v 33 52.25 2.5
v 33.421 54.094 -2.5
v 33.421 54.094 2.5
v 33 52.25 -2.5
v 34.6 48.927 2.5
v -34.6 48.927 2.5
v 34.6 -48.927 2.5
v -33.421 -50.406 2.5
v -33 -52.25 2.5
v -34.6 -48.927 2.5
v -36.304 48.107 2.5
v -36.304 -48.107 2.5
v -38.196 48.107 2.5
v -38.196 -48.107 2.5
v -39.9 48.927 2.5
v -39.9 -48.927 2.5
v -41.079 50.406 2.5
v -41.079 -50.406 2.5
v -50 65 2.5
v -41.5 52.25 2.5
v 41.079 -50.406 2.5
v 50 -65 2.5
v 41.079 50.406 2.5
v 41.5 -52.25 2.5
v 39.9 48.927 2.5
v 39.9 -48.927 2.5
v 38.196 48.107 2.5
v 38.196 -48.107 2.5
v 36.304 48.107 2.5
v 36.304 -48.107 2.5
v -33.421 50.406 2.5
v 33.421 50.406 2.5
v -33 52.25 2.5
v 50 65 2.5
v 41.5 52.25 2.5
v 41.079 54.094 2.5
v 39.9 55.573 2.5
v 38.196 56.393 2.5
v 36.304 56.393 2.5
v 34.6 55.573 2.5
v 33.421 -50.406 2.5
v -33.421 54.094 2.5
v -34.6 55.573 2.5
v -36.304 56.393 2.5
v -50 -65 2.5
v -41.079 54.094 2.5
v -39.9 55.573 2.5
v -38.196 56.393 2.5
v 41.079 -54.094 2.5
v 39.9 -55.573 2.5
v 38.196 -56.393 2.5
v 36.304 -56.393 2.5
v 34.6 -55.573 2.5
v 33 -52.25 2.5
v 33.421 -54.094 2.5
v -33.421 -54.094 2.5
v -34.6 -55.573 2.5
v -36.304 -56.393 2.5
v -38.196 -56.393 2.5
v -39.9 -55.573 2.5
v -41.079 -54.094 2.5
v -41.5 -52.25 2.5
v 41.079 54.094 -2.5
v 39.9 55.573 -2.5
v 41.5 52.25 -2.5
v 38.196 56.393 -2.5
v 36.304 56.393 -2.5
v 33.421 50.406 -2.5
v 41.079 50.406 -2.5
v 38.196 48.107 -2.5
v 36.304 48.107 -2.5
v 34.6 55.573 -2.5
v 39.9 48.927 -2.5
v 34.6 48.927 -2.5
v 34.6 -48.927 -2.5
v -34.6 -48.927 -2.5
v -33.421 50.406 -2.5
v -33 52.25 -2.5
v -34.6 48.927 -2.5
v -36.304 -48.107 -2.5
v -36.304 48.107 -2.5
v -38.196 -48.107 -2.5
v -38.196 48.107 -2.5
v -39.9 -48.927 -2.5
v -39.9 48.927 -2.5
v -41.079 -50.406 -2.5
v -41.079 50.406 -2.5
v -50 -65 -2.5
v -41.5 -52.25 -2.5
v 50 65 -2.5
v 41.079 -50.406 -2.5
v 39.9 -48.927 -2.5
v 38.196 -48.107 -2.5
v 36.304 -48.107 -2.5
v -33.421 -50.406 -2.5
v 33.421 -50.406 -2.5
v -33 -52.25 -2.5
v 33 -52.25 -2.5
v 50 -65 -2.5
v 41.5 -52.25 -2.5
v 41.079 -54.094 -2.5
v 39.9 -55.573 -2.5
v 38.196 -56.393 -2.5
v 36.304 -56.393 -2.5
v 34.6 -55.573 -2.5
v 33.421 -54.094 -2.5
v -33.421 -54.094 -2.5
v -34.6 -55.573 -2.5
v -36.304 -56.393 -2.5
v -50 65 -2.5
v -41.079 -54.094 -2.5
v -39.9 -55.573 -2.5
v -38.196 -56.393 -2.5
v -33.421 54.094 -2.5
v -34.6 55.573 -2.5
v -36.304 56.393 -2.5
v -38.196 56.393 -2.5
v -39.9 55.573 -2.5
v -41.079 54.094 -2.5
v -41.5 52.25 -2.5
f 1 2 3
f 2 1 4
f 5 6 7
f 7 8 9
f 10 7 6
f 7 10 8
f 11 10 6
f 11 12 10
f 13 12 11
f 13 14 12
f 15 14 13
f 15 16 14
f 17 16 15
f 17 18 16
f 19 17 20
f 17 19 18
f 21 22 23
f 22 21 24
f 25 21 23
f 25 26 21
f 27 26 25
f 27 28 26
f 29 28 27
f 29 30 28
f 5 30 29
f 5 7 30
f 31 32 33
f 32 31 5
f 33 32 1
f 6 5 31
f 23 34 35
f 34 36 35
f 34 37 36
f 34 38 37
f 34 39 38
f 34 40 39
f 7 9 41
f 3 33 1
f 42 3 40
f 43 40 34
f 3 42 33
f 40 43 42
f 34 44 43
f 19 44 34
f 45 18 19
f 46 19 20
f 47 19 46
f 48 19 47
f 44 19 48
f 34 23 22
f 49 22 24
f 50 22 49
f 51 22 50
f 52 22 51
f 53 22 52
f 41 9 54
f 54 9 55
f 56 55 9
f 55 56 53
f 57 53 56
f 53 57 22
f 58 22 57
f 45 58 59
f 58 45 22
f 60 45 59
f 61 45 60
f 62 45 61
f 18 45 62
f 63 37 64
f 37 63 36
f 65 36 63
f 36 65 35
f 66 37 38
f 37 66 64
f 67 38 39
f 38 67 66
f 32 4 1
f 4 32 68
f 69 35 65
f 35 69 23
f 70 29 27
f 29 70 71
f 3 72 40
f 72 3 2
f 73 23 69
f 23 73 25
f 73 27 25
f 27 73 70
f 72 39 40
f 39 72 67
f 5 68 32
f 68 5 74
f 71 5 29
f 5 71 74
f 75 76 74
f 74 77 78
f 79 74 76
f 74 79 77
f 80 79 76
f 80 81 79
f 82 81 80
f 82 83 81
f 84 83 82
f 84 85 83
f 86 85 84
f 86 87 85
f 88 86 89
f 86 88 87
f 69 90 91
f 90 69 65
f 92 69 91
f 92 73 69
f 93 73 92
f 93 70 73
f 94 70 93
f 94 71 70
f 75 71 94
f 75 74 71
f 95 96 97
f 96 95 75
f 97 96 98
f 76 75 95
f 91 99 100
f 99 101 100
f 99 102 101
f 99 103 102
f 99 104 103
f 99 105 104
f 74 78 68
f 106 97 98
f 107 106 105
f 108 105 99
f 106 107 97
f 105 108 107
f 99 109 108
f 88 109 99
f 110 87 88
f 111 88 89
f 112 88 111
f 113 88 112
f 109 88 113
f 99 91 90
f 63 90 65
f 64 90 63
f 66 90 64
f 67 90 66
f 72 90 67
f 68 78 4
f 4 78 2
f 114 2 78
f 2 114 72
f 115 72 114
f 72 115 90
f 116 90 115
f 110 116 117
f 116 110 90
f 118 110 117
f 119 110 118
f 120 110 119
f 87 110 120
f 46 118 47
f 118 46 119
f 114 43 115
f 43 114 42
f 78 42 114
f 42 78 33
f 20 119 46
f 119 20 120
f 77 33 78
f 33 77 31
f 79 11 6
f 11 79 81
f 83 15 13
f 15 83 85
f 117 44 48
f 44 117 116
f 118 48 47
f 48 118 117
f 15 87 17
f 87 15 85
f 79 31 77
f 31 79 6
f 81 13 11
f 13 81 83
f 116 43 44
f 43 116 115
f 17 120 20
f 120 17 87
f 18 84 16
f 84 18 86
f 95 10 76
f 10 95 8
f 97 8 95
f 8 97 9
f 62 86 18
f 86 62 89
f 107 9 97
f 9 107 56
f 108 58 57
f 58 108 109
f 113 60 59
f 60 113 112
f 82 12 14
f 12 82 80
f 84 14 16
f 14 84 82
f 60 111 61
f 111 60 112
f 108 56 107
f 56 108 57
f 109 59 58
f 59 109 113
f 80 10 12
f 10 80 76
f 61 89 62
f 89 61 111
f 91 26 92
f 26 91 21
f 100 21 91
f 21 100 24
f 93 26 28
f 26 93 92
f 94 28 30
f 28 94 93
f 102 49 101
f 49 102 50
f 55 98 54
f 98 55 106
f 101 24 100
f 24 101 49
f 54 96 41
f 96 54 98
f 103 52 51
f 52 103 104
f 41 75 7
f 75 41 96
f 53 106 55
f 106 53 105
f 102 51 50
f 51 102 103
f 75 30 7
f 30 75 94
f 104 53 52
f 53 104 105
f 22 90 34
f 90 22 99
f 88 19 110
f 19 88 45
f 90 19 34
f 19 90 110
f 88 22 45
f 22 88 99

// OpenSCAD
// Generated by SolidPython 1.1.3 on 2023-07-05 19:44:39


difference() {
	cube(center = true, size = [100, 130.0000000000, 5]);
	union() {
		translate(v = [37.2500000000, 52.2500000000]) {
			cylinder(center = true, h = 5, r = 4.2500000000);
		}
		translate(v = [-37.2500000000, 52.2500000000]) {
			cylinder(center = true, h = 5, r = 4.2500000000);
		}
		translate(v = [-37.2500000000, -52.2500000000]) {
			cylinder(center = true, h = 5, r = 4.2500000000);
		}
		translate(v = [37.2500000000, -52.2500000000]) {
			cylinder(center = true, h = 5, r = 4.2500000000);
		}
	}
}
/***********************************************
*********      SolidPython code:      **********
************************************************
 
import solid
import numbers
import pudb
from solid.utils import *
import viewscad
import subprocess
import os
import os.path as osp
import math
import sys

chamfer_extrude=solid.import_scad("./chamfer_extrude.scad")
chamfer_extrude=chamfer_extrude.chamfer_extrude
r = viewscad.Renderer(width=800, height=800)

def debug(model,f_name,path="/home/ts/code/projects/mfd/designs/debug"):
    solid.scad_render_to_file(model,osp.join(path,f_name)+".scad")
#generate position list of wells using offset from center
wells_pos_from_center_4 = lambda offset: [[-offset,offset],
                                        [offset, offset],
                                        [-offset, -offset],
                                        [offset, -offset]]
#wells_pos_from_center_2 = lambda offset: [[0,offset],
#                                        [0, -offset]]
wells_pos_from_center_2 = lambda offset: [[offset,0],
                                        [-offset,0]]

def make_well(dims,shape=None,height=None,dxf=False):
    def circle_cylinder():
        if dxf or (height is None):
            well = solid.circle(r=dims, segments=64)
        else:
            well = solid.cylinder(r=dims, h=height, segments=64, center = True)
        return well
    if dims is None:
        sys.exit("radius needs to be a number")
    if isinstance(dims, numbers.Number):
        well =circle_cylinder()
    elif len(dims)==1:
        if isinstance(dims[1], numbers.Number):
            well =circle_cylinder()
        else:
            sys.exit("radius needs to be a number")
    elif len(dims)==2:
        well = solid.square(dims,center = True)
    elif len(dims)==3:
        well = solid.cube(dims, center = True)
    return well

def wells_top_bottom(center_gap,device_dims=None,shape=None,height=None, positions = None, dxf = False):
    well_shape = make_well(device_dims,shape=shape,height=height,dxf=dxf)
    wells = []
    if positions is None:
        offset = radius+radius/2.0
        positions = wells_pos_from_center_2(offset)
    if dxf or (height is None):
        height = 0
    for position in positions:
        if dxf:
            wells.append(solid.translate([position[0],position[1]])(well_shape))
        else:
            wells.append(solid.translate([position[0],position[1],height/2.0])(well_shape))
    return  union()(*wells)

#place wells in four corners 
def four_corner(radius,height=None, positions = None, dxf = False):
    #if well pos not specified set
    #to equally spaced by half radius
    if positions is None:
        offset = radius+radius/2.0
        positions = wells_pos_from_center_4(offset)
    if dxf or (height is None):
        height = 0
    #make wells at positions with specified radius and height
    wells = []
    for position in positions:
        #make circle if making dxf
        if dxf:
            well_shape = solid.circle(r=radius, segments=64)
            well_shape = solid.translate([position[0],position[1]])(well_shape)
        #if stl make cylinder
        else:
            well_shape = solid.cylinder(r=radius, h=height, segments=64, center = True)
            well_shape = solid.translate([position[0],position[1],height/2.0])(well_shape)
        wells.append(well_shape)
    return  union()(*wells)

#generate channels 
def make_channels(length,width,height=0,num_chans=1,max_chans=None,spacing=None, dxf = False,
                  rotate_channels=False):
    if dxf or (height is None):
        height = 0
    #if channel gap not defined, is equal to
    if spacing is None: spacing = width
    #calculate number of channels if fitting max num within given width
    if not max_chans is None:
        import math
        num_chans = math.floor((max_chans-spacing)/(width+spacing))
    #get total width of channel section  
    total_width = (width*num_chans)+(spacing*(num_chans-1))

    #make template channel
    #if rotate_channels: width, length = length, width
    if dxf:
        channel_t = solid.square([length,width],center = True)
    else:
        channel_t = solid.cube([length,width,height], center = True)

    #if number channels is even, offset the first channel to center its gap
    if num_chans % 2 == 0: centering = -(width/2.0+spacing/2.0)
    else: centering = 0
    #move template channel up to align bottom at z = 0 
    #and offset center if necessary
    if dxf:
        channel_t = solid.translate([0,centering])(channel_t)
    else:
        channel_t = solid.translate([0,centering,height/2.0])(channel_t)

    #if rotate_channels: length,width = width,length
    #start making the channels
    channels = []
    for i in range(num_chans):
        #if i=0 there is no translation
        #if i=1, we make the first channel adjacent to second
        direction = i

        #if i>=1, we add channels alternating left and right
        if i >= 1:
            direction = -(i/2.0)
            if i % 2 == 1: direction = (-direction)+0.5
                
        #make channel at right position and add it to channel list
        translation_coords = [0,direction*(width+spacing)]
        #if rotate_channels: translation_coords = [direction*(width+spacing),0]
        if dxf:
            channel = solid.translate(translation_coords)(channel_t)
        else:
            channel = solid.translate([*translation_coords,0])(channel_t)
        channels.append(channel)
    
    #group all channels as one object
    channels = union()(*channels)
    #compute the x,y,z dimensions in order to pass as arguments 
    #for construction of other parts of device (such as the chambers)
    measurements = {'x':(length/2.0,-length/2.0),
                    'y':(total_width/2.0,-total_width/2.0)}
    if not dxf:
        measurements['z'] = (height,0)
    if rotate_channels:
        channels = solid.rotate(90)(channels)
        measurements['x'],measurements['y']=measurements['y'],measurements['x']
    return channels,measurements

def make_chambers(msrs,height=None,extra=0,len_until=None,width=None, dxf = False):
    #computes x,y,z length
    total = lambda x : abs(x[0]) + abs(x[1])
    
    #if specific height if specified
    #otherwise use same height as channels
    if dxf:
        pass
    elif not height is None:
        msrs['z'] = (height,0)
    else:
        msrs['z'] = (0,0)
        
    #make copy of measurements from channels to modify chamber dimensions 
    #and add length to chambers as specified
    chamber_dims = msrs.copy()
    #calculate length of chamber to reach specified offset
    if not len_until is None:
        chamber_len = len_until-(msrs['x'][0])
    #or add specified length to channel length (if not specified, adds 0)
    else:
        chamber_len = msrs['x'][0]+extra
    #set the chamber length based 
    chamber_dims['x'] = (chamber_len/2.0,-(chamber_len/2.0))
    #compute final dimensions of chamber
    if not width is None:
        chamber_dims['y'] = (width/2.0,-width/2.0)
    chamber_dims = [total(size) for size in chamber_dims.values()]
        
    #calculate chamber translation offset to place adjacent to channels
    chamber_trslt = msrs['x'][0]+(chamber_len/2.0)
    #compute chamber translation coordinates to align with channels
    #x = 1 moves chamber above channels
    #x = -1 moves chamber below channels
    if dxf:
        trslt = lambda x : [x*(chamber_trslt),0]
    else:
        trslt = lambda x : [x*(chamber_trslt),0,msrs['z'][0]/2.0]
    
    #function to make chamber at top or at bottom 
    if dxf:
        move = lambda x : solid.translate(trslt(x))(solid.square(chamber_dims, center = True) )
    else:
        move = lambda x : solid.translate(trslt(x))(solid.cube(chamber_dims,center = True))
    #make top and bottom chambers and return them as grouped
    top = move(1)
    bottom = move(-1)
    #chambers=solid.rotate(90)(solid.union()(top,bottom))
    chambers=(solid.union()(top,bottom))

    return chambers

#create alignment features 
def alignment_features(unit,dims,grid_size, mask_size = None, alignment = "hollow", units_from_center = (2.5,2.5), corner_len=None):
    width = grid_size[0]*dims[0]
    length = grid_size[1]*dims[1]
    if mask_size is None and corner_len is None:
        corner_len = (dims[0] + dims[1]) /2 / 8
    corner = lambda thickness_div : solid.union()( solid.square([corner_len,corner_len/thickness_div],center=False), solid.square([corner_len/thickness_div,corner_len],center=False) )
    
    def make_full(thickness_div):
        thickness = corner_len/thickness_div
        tr = solid.translate([0, 0, 0 ])(solid.rotate(180)(corner(thickness_div)))
        tr = solid.translate([thickness/2,thickness/2,0])(tr)
        bl = solid.translate([0, 0, 0 ])(solid.rotate(0)(corner(thickness_div)))
        bl = solid.translate([-thickness/2,-thickness/2,0])(bl)
        return solid.union()(tr,bl)
    
    def make_hollow(thickness_div):
        thickness = corner_len/(thickness_div/2)
        inner = make_full(thickness_div)
        outer = make_full(thickness_div/2)
        hollow = outer - inner 
        return hollow
    
    center = (width /2 , length/2)
    mask_pos = lambda x,y : (center[0] + x*(float(units_from_center[0])*dims[0]), center[1] + y*(float(units_from_center[1])*dims[1]))
    positions = []
    positions.append(mask_pos(1,0))
    positions.append(mask_pos(0,1))
    positions.append(mask_pos(-1,0))
    positions.append(mask_pos(0,-1))
    make_mask = lambda mtype : make_hollow(8) if mtype == "hollow" else make_full(8)
    masks = [ solid.translate([*position,0])(make_mask(alignment)) for position in positions]
    
    solid.scad_render_to_file(solid.union()(*masks),"./designs/open_chamber/masks.scad")
    #return unit - solid.union()(*masks)
    return solid.union()(*masks,unit)

def create_outline(thickness, array, dims, grid_size,):
    width = grid_size[0]*dims[0] + thickness *2
    length = grid_size[1]*dims[1] + thickness *2
    outer = solid.translate([-thickness, -thickness,0])(solid.square([width, length]))
    return outer-array

def create_wall(wall_thickness, outline_thickness, dims, grid_size, wall_height = 2000, dxf = False):
    inner_width = grid_size[0]*dims[0] + outline_thickness *2
    inner_length = grid_size[1]*dims[1] + outline_thickness *2
    outer_width = inner_width + wall_thickness * 2
    outer_length = inner_length + wall_thickness * 2
    outer_pos_x = -outline_thickness-wall_thickness
    outer_pos_y = -outline_thickness-wall_thickness
    inner_pos_x = -outline_thickness
    inner_pos_y = -outline_thickness
    if dxf:
        inner_wall = solid.translate([inner_pos_x,
                                      inner_pos_y,
                                      0])(solid.square([inner_width, inner_length]))
        outer_wall = solid.translate([outer_pos_x,
                                      outer_pos_y,
                                      0])(solid.square([outer_width, outer_length]))

        return outer_wall-inner_wall
    else:
        inner_wall = solid.translate([inner_pos_x,
                                      inner_pos_y,
                                      0])(solid.cube([inner_width, inner_length,wall_height]))
        outer_wall = solid.translate([outer_pos_x,
                                      outer_pos_y,
                                      0])(solid.cube([outer_width, outer_length,wall_height]))

        return outer_wall-inner_wall, {'wall_height': wall_height,
                                       'wall_thickness': wall_thickness,
                                       'inner_width':inner_width,
                                       'inner_length': inner_length,
                                       'outer_width': outer_width,
                                       'outer_length': outer_length,
                                       'outer_pos_x' : outer_pos_x,
                                       'outer_pos_y' : outer_pos_y,
                                       'inner_pos_x' : inner_pos_x,
                                       'inner_pos_y' : inner_pos_y}

def create_thicker_wall(wall_thickness, outer_wall_offset, wall_dims, dims, grid_size, height_start = .2, height_end=2, dxf = False):
    addon_wall,thicker_wall_dims = create_wall(wall_thickness, outer_wall_offset, dims, grid_size, wall_height=height_end-height_start, dxf = False)
    addon_wall = solid.translate([0,0,height_start])(addon_wall)

    thicker_wall_dims['wall_height'] = height_end
    thicker_wall_dims['wall_thickness'] = wall_dims['wall_thickness'] + wall_thickness
    return addon_wall, thicker_wall_dims
 
def add_lock_to_wall(wall,wall_dims,y_offset = 0,cut_ratio=0.7,L_length=3, gap_ratio=0.05, axis="x",width_ratio=1/2):
    # Makes L shape
    def make_L(max_length,length_thickness,max_width,width_thickness,height,y_offset):
        length = solid.cube([max_length,length_thickness,height])
        width = solid.cube([width_thickness,max_width,height])
        width = solid.translate([max_length-(width_thickness),0,0])(width)
        L = solid.union()(width,length)
        debug(L,"L")
        if axis == "x":
            L = solid.rotate(-90)(L)
            L = solid.translate([0,max_length,0])(L)
        else:
            L = solid.rotate(-180)(L)
            L = solid.translate([max_length,max_width,0])(L)
        return solid.translate([0,0,y_offset])(L)
    
    lock_length = L_length
    lock_width = wall_dims['wall_thickness']*width_ratio
    lock_length_thickness = lock_width/2
    lock_width_thickness = lock_width/2
    L_lock = make_L(lock_length,lock_length_thickness,lock_width,lock_width_thickness, wall_dims['wall_height']-y_offset, y_offset)
    
    margin_space = lock_length - lock_length*(1-gap_ratio)
    key_length = lock_length-margin_space
    key_length_thickness = lock_length_thickness-(margin_space*2)
    key_width = lock_width-(margin_space*2)
    key_width_thickness = lock_width_thickness-(margin_space*2)
    L_key = make_L(key_length,key_length_thickness,key_width,key_width_thickness, wall_dims['wall_height']-y_offset, y_offset)
    L_key = solid.translate([margin_space,margin_space,0])(L_key)
    L = solid.union()(L_lock,L_key)
    debug(L,"L")
    
    #Make cube to be used as negative to split frame in a half
    #Can choose if making left or right negative, specify ratio of split
    def make_negative(right,cut_ratio):
        if axis == "x":
            if right:
                length = wall_dims['outer_length']*(1-cut_ratio)
                pos_x = wall_dims['outer_pos_x']+(wall_dims['outer_length']*cut_ratio)
            else:
                length = wall_dims['outer_length']*(cut_ratio)
                pos_x = wall_dims['outer_pos_x'] 
            negative = solid.cube([wall_dims['outer_width'],length, wall_dims['wall_height']])
            negative = solid.translate([wall_dims['outer_pos_y'],pos_x,0])(negative)
        else:
            if right:
                length = wall_dims['outer_width']*(1-cut_ratio)
                pos_x = wall_dims['outer_pos_y']+(wall_dims['outer_width']*cut_ratio)
            else:
                length = wall_dims['outer_width']*(cut_ratio)
                pos_x = wall_dims['outer_pos_y'] 
            negative = solid.cube([length,wall_dims['outer_length'], wall_dims['wall_height']])
            negative = solid.translate([pos_x,wall_dims['outer_pos_x'],0])(negative)
        return negative, pos_x, length 
                      
    #Make negatives
    negative_right, right_half_pos_x, right_half_length = make_negative(True,cut_ratio)
    negative_left, left_half_pos_x, right_half_length = make_negative(False,cut_ratio)
    #Make halves
    left_half = solid.difference()(wall,negative_right)
    right_half = solid.difference()(wall,negative_left)
    def place_L(L, L_length,L_width):
        #Place L on top wall       
        offset_to_center = (wall_dims['wall_thickness']-L_width)/2
        if axis == "x":
            y_pos_top = (wall_dims['outer_pos_y'] +
                    wall_dims['outer_width'] - 
                    L_width - offset_to_center)
            top_L = solid.translate([y_pos_top,
                                     right_half_pos_x-(L_length),
                                     0])(L)
            #Place L on bottom wall       
            y_pos_bottom = wall_dims['outer_pos_y']+offset_to_center
            bottom_L = solid.translate([y_pos_bottom,
                                        right_half_pos_x-L_length,
                                        0])(L)
        else:
            y_pos_top = (wall_dims['outer_pos_x'] +
                    wall_dims['outer_length'] -
                    (L_width+offset_to_center))
            top_L = solid.translate([right_half_pos_x-L_length,
                                     y_pos_top,
                                     0])(L)
            #Place L on bottom wall       
            y_pos_bottom = wall_dims['outer_pos_y']+offset_to_center
            bottom_L = solid.translate([right_half_pos_x-L_length,
                                        y_pos_bottom,
                                        0])(L)
        return bottom_L, top_L
    #Make complimentary L pieces through union and differences
    #Make Lock
    bottom_L_lock, top_L_lock = place_L(L_lock,L_length,lock_width)
    left_half = solid.difference()(left_half,bottom_L_lock)
    left_half = solid.difference()(left_half,top_L_lock)
    #Make Key
    bottom_L_key, top_L_key = place_L(L_key,L_length,lock_width)
    right_half = solid.union()(right_half,bottom_L_key)
    right_half = solid.union()(right_half,top_L_key)
    return left_half, right_half


#build a row x col grid of containment units
def make_unit_array(unit,dims,grid_size, dxf = False, alignment = None, mask_size = None,
                    units_from_center = None,alignment_offset=None, alignment_mark_size=1):
    units = []
    for col in range(grid_size[1]):
        for row in range(grid_size[0]):
            if dxf:
                units.append(solid.translate([row*dims[0],col*dims[1]])(unit))
            else:
                units.append(solid.translate([row*dims[0],col*dims[1],dims[2]/2.0])(unit))
    array = solid.union()(*units)
    if (not alignment is None) and dxf:
        if not alignment_offset is None:
            array = solid.translate([alignment_offset[0],alignment_offset[1]])(array)
        array = alignment_features(array,dims, grid_size, alignment = alignment, mask_size = None, units_from_center = units_from_center,corner_len=alignment_mark_size)
        if not alignment_offset is None:
            array = solid.translate([-alignment_offset[0],-alignment_offset[1]])(array)
    return array


def make_taylor(wells_pos = wells_pos_from_center_4(2.25), well_rad = 1.5 ,
                well_height = 2, chan_w = 0.01, chan_l = 1, chan_h = 0.010 ,
                chan_gap = 0.040, max_chans = None,num_chans=100, chamber_height  = 0.100,
                columns = 1, rows = 1, chamber_len_until=2.25, add_channels = True, add_wells = True, 
                add_chambers = True, save_path = "./", alignment = None, units_from_center = 2,
                mask_size = None, render_stl = False, outline_thickness = 0.050, dxf = True,
                wall_height = 15, wall_thickness = 0.95, casing_x=9, casing_y=9, casing_z=0,rotate_units=0):

    dims = [casing_x, casing_y, casing_z]
    wells = four_corner(well_rad,well_height, dxf = dxf, positions = wells_pos)
    debug(wells,"wells")
    channels, msrs = make_channels(chan_l,chan_w,chan_h,dxf=dxf, spacing = chan_gap, max_chans=max_chans,num_chans=num_chans)
    debug(channels,"channels")
    chambers = make_chambers(msrs,dxf = dxf, height=chamber_height,len_until=chamber_len_until)
    debug(chambers,"chambers")

    #add together and render
    device_parts = []
    if add_channels:
        device_parts.append(channels)
    if add_wells:
        device_parts.append(wells)
    if add_chambers:
        device_parts.append(chambers)
    device=union()(*device_parts)
    device = rotate(rotate_units)(device)

    device=solid.translate([dims[0]/2.0,dims[1]/2.0,0])(device)
    channels = rotate(rotate_units)(channels)
    channels=solid.translate([dims[0]/2,dims[1]/2,0])(channels)
    chambers_wells = union()(wells,chambers)
    chambers_wells = rotate(rotate_units)(chambers_wells)
    chambers_wells=solid.translate([dims[0]/2,dims[1]/2,0])(chambers_wells)

    file_name = str(rows)+'x'+str(columns)+'_units_'
    grid_size = [rows,columns]

    if alignment:
        alignment="full"
    device = make_unit_array(device,dims,grid_size, dxf=dxf, alignment = alignment,
                                 units_from_center = units_from_center)
    channels = make_unit_array(channels,dims,grid_size, dxf=dxf, alignment = alignment,
                                 units_from_center = units_from_center)
    if alignment=="full":
        alignment="hollow"

    chambers_wells = make_unit_array(chambers_wells,dims,grid_size, dxf=dxf, alignment = alignment,
                                 units_from_center =units_from_center)

    def save_model(model,prefix):
        model_fname = os.path.abspath(save_path+prefix+"_"+file_name+".scad")
        solid.scad_render_to_file(model,model_fname)
        return model_fname

    wells_fname = save_model(wells,"wells")
    channels_fname = save_model(channels,"channels")
    device_fname = save_model(device,"device")
    chambers_wells_fname = save_model(chambers_wells,"chambers_wells")
    return (chambers_wells,chambers_wells_fname), (channels,channels_fname), (device,device_fname)

def make_device(design='open',rows=8,columns=6,wells_pos = 4.5,well_offset=3.2, well_rad=3.2,well_height=0.1,
                chan_l=1,chan_w=0.01,chan_h=0.01,chan_gap=0.015,num_chans=101,dxf=True,save_path="./designs/open_chamber/",
                casing_x=9.0,casing_y=18.0,casing_z=0,rotate_units=90,units_from_center=(3,1),chamber_len_until=4.5,
                chamber_width=None,alignment=True, add_wells=True, add_channels=True,add_chambers=True):

    dims = [casing_x, casing_y, casing_z]
    if design == "open":
        wells_pos=wells_pos_from_center_2(wells_pos)
        wells = wells_top_bottom(well_offset*2,device_dims=well_rad,height=well_height, dxf = dxf, positions = wells_pos)
    elif design == "closed":
        wells_pos=wells_pos_from_center_4(wells_pos)
        debug(wells,"wells")
        wells = four_corner(well_offset,well_heightdevice_dims=well_rad, dxf = dxf, positions = wells_pos)
    else:
        print(design+" is not a valid design.\n Choose valid design: 'open' or 'closed'")
        exit()
    wells = rotate(rotate_units)(wells)
    wells=solid.translate([dims[0]/2,dims[1]/2,0])(wells)
    debug(wells,"wells")

    channels, msrs = make_channels(chan_l,chan_w,chan_h,dxf=dxf, spacing = chan_gap, num_chans=num_chans,rotate_channels=False)
    channels = rotate(rotate_units)(channels)
    channels=solid.translate([dims[0]/2,dims[1]/2,0])(channels)

    chambers=make_chambers(msrs,height=None,extra=0,len_until=chamber_len_until, width=chamber_width,dxf = dxf)
    chambers = rotate(rotate_units)(chambers)
    chambers=solid.translate([dims[0]/2,dims[1]/2,0])(chambers)

    device_parts = []
    if add_channels:
        device_parts.append(channels)
    if add_wells:
        device_parts.append(wells)
    if add_chambers:
        device_parts.append(chambers)
    device = union()(*device_parts)
    #device = rotate(rotate_units)(device)
    #device=solid.translate([dims[0]/2.0,dims[1]/2.0,0])(device)

    chambers_wells = []
    if add_chambers:
        chambers_wells.append(chambers)
    if add_wells:
        chambers_wells.append(wells)
    chambers_wells = union()(*chambers_wells)
    #chambers_wells = union()(wells,chambers)
    #chambers_wells = rotate(rotate_units)(chambers_wells)
    #chambers_wells=solid.translate([dims[0]/2,dims[1]/2,0])(chambers_wells)

    file_name = str(rows)+'x'+str(columns)+'_units_'

    grid_size = [rows,columns]
    if alignment:
        alignment="full"
    device = make_unit_array(device,dims,grid_size, dxf=dxf, alignment = alignment,
                                 units_from_center = units_from_center)
    channels = make_unit_array(channels,dims,grid_size, dxf=dxf, alignment = alignment,
                                 units_from_center = units_from_center)
    if alignment=="full":
        alignment="hollow"

    chambers_wells = make_unit_array(chambers_wells,dims,grid_size, dxf=dxf, alignment = alignment,
                                 units_from_center =units_from_center)

    def save_model(model,prefix):
        model_fname = os.path.abspath(save_path+prefix+"_"+file_name+".scad")
        solid.scad_render_to_file(model,model_fname)
        return model_fname

    wells_fname = save_model(wells,"wells")
    channels_fname = save_model(channels,"channels")
    device_fname = save_model(device,"device")
    chambers_wells_fname = save_model(chambers_wells,"chambers_wells")
    return (chambers_wells,chambers_wells_fname), (channels,channels_fname), (device,device_fname)


def make_open_chamber(rows=8,columns=6,wells_pos = wells_pos_from_center_2(4.5), well_rad=3.2,well_height=0.1,
                      chan_l=1,chan_w=0.01,chan_h=0.01,chan_gap=0.015,num_chans=101,dxf=True,save_path="./designs/open_chamber/",
                      casing_x=9.0,casing_y=18.0,casing_z=0,rotate_units=90,units_from_center=(3,1),chamber_len_until=4.5,
                      chamber_width=None,alignment=True, add_wells=True, add_channels=True,add_chambers=True):

    dims = [casing_x, casing_y, casing_z]
    wells = wells_top_bottom(well_rad,height=well_height, dxf = dxf, positions = wells_pos)
    channels, msrs = make_channels(chan_l,chan_w,chan_h,dxf=dxf, spacing = chan_gap, num_chans=num_chans,rotate_channels=False)
    chambers=make_chambers(msrs,height=None,extra=0,len_until=chamber_len_until, width=chamber_width,dxf = dxf)
    debug(chambers,"chambers")
    device_parts = []
    if add_channels:
        device_parts.append(channels)
    if add_wells:
        device_parts.append(wells)
    if add_chambers:
        device_parts.append(chambers)
    device = union()(*device_parts)
    device = rotate(rotate_units)(device)
    device=solid.translate([dims[0]/2.0,dims[1]/2.0,0])(device)
    channels = rotate(rotate_units)(channels)
    channels=solid.translate([dims[0]/2,dims[1]/2,0])(channels)
    chambers_wells = union()(wells,chambers)
    chambers_wells = rotate(rotate_units)(chambers_wells)
    chambers_wells=solid.translate([dims[0]/2,dims[1]/2,0])(chambers_wells)

    file_name = str(rows)+'x'+str(columns)+'_units_'

    grid_size = [rows,columns]
    if alignment:
        alignment="full"
    device = make_unit_array(device,dims,grid_size, dxf=dxf, alignment = alignment,
                                 units_from_center = units_from_center)
    channels = make_unit_array(channels,dims,grid_size, dxf=dxf, alignment = alignment,
                                 units_from_center = units_from_center)
    if alignment=="full":
        alignment="hollow"

    chambers_wells = make_unit_array(chambers_wells,dims,grid_size, dxf=dxf, alignment = alignment,
                                 units_from_center =units_from_center)

    def save_model(model,prefix):
        model_fname = os.path.abspath(save_path+prefix+"_"+file_name+".scad")
        solid.scad_render_to_file(model,model_fname)
        return model_fname

    wells_fname = save_model(wells,"wells")
    channels_fname = save_model(channels,"channels")
    device_fname = save_model(device,"device")
    chambers_wells_fname = save_model(chambers_wells,"chambers_wells")
    return (chambers_wells,chambers_wells_fname), (channels,channels_fname), (device,device_fname)

def to_dxf(scad_path):
    dxf_path = scad_path.replace(".scad",".dxf")
    subprocess.call(["openscad", "-o", dxf_path, scad_path])
    import ezdxf
    temp_dxf = ezdxf.readfile(dxf_path)
    temp_dxf.saveas(dxf_path)

#def make_walls(diameter,thickness,grid_size,dims,height=20,segments=256,make_inner=True):
#    wafer_wall_out = solid.cylinder(r=diameter/2,h=height, segments=segments)
#    wafer_wall_in = solid.cylinder(r=(diameter/2-thickness),h=height, segments=segments)
#    wafer_wall = solid.difference()(wafer_wall_out,wafer_wall_in)
#    wafer_wall = solid.translate([grid_size[1]*dims[1]/2.0,grid_size[0]*dims[0]/2.0])(wafer_wall)
#
#    vertical_wall_length = grid_size[1]*dims[1]
#    horizontal_wall_length = grid_size[0]*dims[0]
#    vertical_wall = solid.cube([vertical_wall_length,thickness,height],center = True)
#    vertical_wall = solid.translate([vertical_wall_length/2,0,height/2])(vertical_wall)
#    horizontal_wall = solid.cube([thickness,horizontal_wall_length,height],center = True)
#    horizontal_wall = solid.translate([0,vertical_wall_length/2,height/2])(horizontal_wall)
#    walls = []
#    walls.append(horizontal_wall)
#    walls.append(vertical_wall)
#    for col in range(grid_size[1]):
#        if col == grid_size[1]-1: 
#            walls.append(solid.translate([0,(col+1)*dims[1]])(vertical_wall))
#        elif col > 0 and col < grid_size[1]-1 and make_inner==True:
#            walls.append(solid.translate([0,(col+1)*dims[1]])(vertical_wall))
#    for row in range(grid_size[0]):
#        if row == grid_size[0]-1: 
#            walls.append(solid.translate([(row+1)*dims[0],0])(horizontal_wall))
#        elif row > 0 and row < grid_size[0]-1 and make_inner==True:
#            walls.append(solid.translate([(row+1)*dims[0],0])(horizontal_wall))
#    walls = union()(*walls)
#    wafer_walls = union()(walls,wafer_wall)
#    return walls,wafer_wall,wafer_walls

def make_walls(diameter,thickness,grid_size,dims,height=20,segments=256,make_inner=True,padx=0,pady=0):
    wafer_wall_out = solid.cylinder(r=diameter/2,h=height, segments=segments)
    wafer_wall_in = solid.cylinder(r=(diameter/2-thickness),h=height, segments=segments)
    wafer_wall = solid.difference()(wafer_wall_out,wafer_wall_in)
    wafer_wall = solid.translate([grid_size[1]*dims[1]/2.0,grid_size[0]*dims[0]/2.0])(wafer_wall)

    vertical_wall_length = grid_size[0]*dims[0]+padx
    horizontal_wall_length = grid_size[1]*dims[1]+pady
    vertical_wall = solid.cube([vertical_wall_length,thickness,height],center = True)
    vertical_wall = solid.translate([vertical_wall_length/2-pady/2,-padx/2,height/2])(vertical_wall)
    horizontal_wall = solid.cube([thickness,horizontal_wall_length,height],center = True)
    horizontal_wall = solid.translate([-pady/2,horizontal_wall_length/2-padx/2,height/2])(horizontal_wall)
    walls = []
    walls.append(horizontal_wall)
    walls.append(vertical_wall)
    for col in range(grid_size[1]):
        if col == grid_size[1]-1: 
            walls.append(solid.translate([0,(col+1)*dims[1]+pady])(vertical_wall))
        elif col > 0 and col < grid_size[1]-1 and make_inner==True:
            walls.append(solid.translate([0,(col+1)*dims[1]])(vertical_wall))
    for row in range(grid_size[0]):
        if row == grid_size[0]-1: 
            walls.append(solid.translate([(row+1)*dims[0]+padx,0])(horizontal_wall))
        elif row > 0 and row < grid_size[0]-1 and make_inner==True:
            walls.append(solid.translate([(row+1)*dims[0],0])(horizontal_wall))
    walls = union()(*walls)
    wafer_walls = union()(walls,wafer_wall)
    return walls,wafer_wall,wafer_walls

def save_model(model,base_path,base_name,dxf=True):
    if not os.path.exists(base_path):
        os.makedirs(base_path)
    dxf_path=osp.join(base_path,base_name+".scad")
    solid.scad_render_to_file(model,osp.join(dxf_path))
    if dxf:
        to_dxf(dxf_path)

def make_wafer(diameter,flat_len,thickness):
    wafer = solid.cylinder(r1=diameter/2,r2=diameter/2,h=thickness,segments=512,)()
    x_start_flat=(flat_len/2)
    y_start_flat = math.sqrt(((diameter/2)**2) - (x_start_flat**2) )
    height_delete_flat=diameter/2-y_start_flat
    flat_delete = solid.cube([flat_len,height_delete_flat,thickness],center=False)()
    flat_delete = solid.translate([-flat_len/2,y_start_flat,0])(flat_delete)
    wafer = solid.difference()(wafer,flat_delete)
    wafer = solid.rotate(90)(wafer)
    return wafer

def add_wafer_to_mask(wafer_size,flat_len,mask,grid_size,dims,wafer_line_thickness=0.1,outer_mask_thickness=5,alignment_offset=None):
    def make_wafer_mask(wafer_size,flat_len):
        wafer_mask = make_wafer(wafer_size,flat_len,1)
        wafer_mask = solid.projection()(wafer_mask)
        wafer_mask = solid.translate([grid_size[0]*dims[0]/2.0,grid_size[1]*dims[1]/2.0])(wafer_mask)
        if not alignment_offset is None:
            wafer_mask = solid.translate([-alignment_offset[0],-alignment_offset[1]])(wafer_mask)
        return wafer_mask

    inner_wafer_line_mask = make_wafer_mask(wafer_size-wafer_line_thickness/2,flat_len)
    outer_wafer_line_mask = make_wafer_mask(wafer_size+wafer_line_thickness/2,flat_len)
    outer_wafer_mask = make_wafer_mask(wafer_size+outer_mask_thickness,flat_len)
    outer_wafer_mask = solid.difference()(outer_wafer_mask,outer_wafer_line_mask)
    wafer_mask = solid.union()(outer_wafer_mask,inner_wafer_line_mask)

    return solid.difference()(wafer_mask,mask)

def make_posts(post_shape,post_height):
    posts = solid.linear_extrude(height=post_height)(post_shape)
    return posts

def make_wafer_empty(diameter,flat_len,thickness,margin,notch_len=20,notch_height=5,oversize=1.01):
    diameter*=oversize
    flat_len*=oversize
    wafer = make_wafer(diameter,flat_len,thickness)
    holder = solid.cylinder(r1=diameter/2+margin,r2=diameter/2+margin,h=thickness,segments=512)()
    holder = solid.difference()(holder,wafer)

    x_start_flat=(flat_len/2)
    y_start_flat = math.sqrt(((diameter/2)**2) - (x_start_flat**2) )
    height_delete_flat=diameter/2-y_start_flat
    notch = solid.cube([notch_len,notch_height,thickness],center=False)()
    notch = solid.translate([-notch_len/2,y_start_flat,0])(notch)
    notch = solid.rotate(90)(notch)
    return solid.difference()(holder,notch)

def wafer_print_calibration(diameter,thickness,height,z_offset):
    circles = []
    radii = []
    radii.append(diameter/2.0*0.8)
    radii.append(diameter/2.0*0.6)
    radii.append(diameter/2.0*0.4)
    radii.append(diameter/2.0*0.2)
    for radius in radii:
        inner = solid.cylinder(r1=radius-(thickness/2.0),r2=radius-(thickness/2.0),h=thickness,segments=512,)()
        outer = solid.cylinder(r1=radius+(thickness/2.0),r2=radius+(thickness/2.0),h=thickness,segments=512,)()
        diff = solid.difference()(outer,inner)
        circles.append(diff)
    circles = solid.union()(*circles)
    circles = solid.translate([0,0,z_offset])(circles)
    return circles

def make_rack(wells,dims,grid_size,alignment_offset,rack_x,rack_y,rack_thickness,bolt_width,add_bolts=True):

    #get X and Y dimensions of gride of pipette tips
    X_len = dims[0]*grid_size[0]
    Y_len = dims[1]*grid_size[1]
    #make rack
    rack = solid.cube([rack_x,rack_y,rack_thickness],center=True)

    if add_bolts:
    #add bolt holes
        bolt_hole=solid.cylinder(r=bolt_width/2,h=rack_thickness,center=True)()
        bolt_holes = []
        bolt_holes.append(solid.translate([rack_x/2-1.5*bolt_width,rack_y/2-1.5*bolt_width])(bolt_hole))
        bolt_holes.append(solid.translate([-rack_x/2+1.5*bolt_width,rack_y/2-1.5*bolt_width])(bolt_hole))
        bolt_holes.append(solid.translate([-rack_x/2+1.5*bolt_width,-rack_y/2+1.5*bolt_width])(bolt_hole))
        bolt_holes.append(solid.translate([rack_x/2-1.5*bolt_width,-rack_y/2+1.5*bolt_width])(bolt_hole))
        bolt_holes = solid.union()(*bolt_holes)
        rack=solid.difference()(rack,bolt_holes)
    rack_support = rack

    #center rack with pipette holes
    rack = solid.translate([0,0,rack_thickness/2])(rack)
    rack = solid.translate([X_len/2,Y_len/2])(rack)
    rack = solid.translate([-alignment_offset[0],-alignment_offset[1]])(rack)
    wells = solid.linear_extrude(height=rack_thickness)(wells)
    rack = solid.difference()(rack,wells)
    return rack, rack_support

def make_pillar(wells,dims,grid_size,alignment_offset,rack_x,rack_y,pillar_height,rack_thickness,bolt_width,add_bolts=True,taper_angle=1,bolt_position_corner=1.5):

    #get X and Y dimensions of gride of pipette tips
    X_len = dims[0]*grid_size[0]
    Y_len = dims[1]*grid_size[1]
    #make rack
    rack = solid.cube([rack_x,rack_y,rack_thickness],center=True)
    
    if add_bolts:
    #add bolt holes
        bolt_hole=solid.cylinder(r=bolt_width/2,h=rack_thickness,center=True)()
        bolt_holes = []
        bolt_holes.append(solid.translate([rack_x/2-bolt_position_corner*bolt_width,rack_y/2-bolt_position_corner*bolt_width])(bolt_hole))
        bolt_holes.append(solid.translate([-rack_x/2+bolt_position_corner*bolt_width,rack_y/2-bolt_position_corner*bolt_width])(bolt_hole))
        bolt_holes.append(solid.translate([-rack_x/2+bolt_position_corner*bolt_width,-rack_y/2+bolt_position_corner*bolt_width])(bolt_hole))
        bolt_holes.append(solid.translate([rack_x/2-bolt_position_corner*bolt_width,-rack_y/2+bolt_position_corner*bolt_width])(bolt_hole))
        bolt_holes = solid.union()(*bolt_holes)
        rack=solid.difference()(rack,bolt_holes)
    rack_support = rack

    #center rack with pipette holes
    #rack = solid.translate([0,0,-rack_thickness])(rack)
    rack = solid.translate([X_len/2,Y_len/2])(rack)
    rack = solid.translate([-alignment_offset[0],-alignment_offset[1]])(rack)
    if not taper_angle == 0:
        wells=chamfer_extrude(pillar_height,taper_angle,segments=20)(wells)
    else:
        wells = solid.linear_extrude(height=pillar_height)(wells)
    rack = solid.union()(rack,wells)
    return rack, rack_support









 
 
************************************************/
